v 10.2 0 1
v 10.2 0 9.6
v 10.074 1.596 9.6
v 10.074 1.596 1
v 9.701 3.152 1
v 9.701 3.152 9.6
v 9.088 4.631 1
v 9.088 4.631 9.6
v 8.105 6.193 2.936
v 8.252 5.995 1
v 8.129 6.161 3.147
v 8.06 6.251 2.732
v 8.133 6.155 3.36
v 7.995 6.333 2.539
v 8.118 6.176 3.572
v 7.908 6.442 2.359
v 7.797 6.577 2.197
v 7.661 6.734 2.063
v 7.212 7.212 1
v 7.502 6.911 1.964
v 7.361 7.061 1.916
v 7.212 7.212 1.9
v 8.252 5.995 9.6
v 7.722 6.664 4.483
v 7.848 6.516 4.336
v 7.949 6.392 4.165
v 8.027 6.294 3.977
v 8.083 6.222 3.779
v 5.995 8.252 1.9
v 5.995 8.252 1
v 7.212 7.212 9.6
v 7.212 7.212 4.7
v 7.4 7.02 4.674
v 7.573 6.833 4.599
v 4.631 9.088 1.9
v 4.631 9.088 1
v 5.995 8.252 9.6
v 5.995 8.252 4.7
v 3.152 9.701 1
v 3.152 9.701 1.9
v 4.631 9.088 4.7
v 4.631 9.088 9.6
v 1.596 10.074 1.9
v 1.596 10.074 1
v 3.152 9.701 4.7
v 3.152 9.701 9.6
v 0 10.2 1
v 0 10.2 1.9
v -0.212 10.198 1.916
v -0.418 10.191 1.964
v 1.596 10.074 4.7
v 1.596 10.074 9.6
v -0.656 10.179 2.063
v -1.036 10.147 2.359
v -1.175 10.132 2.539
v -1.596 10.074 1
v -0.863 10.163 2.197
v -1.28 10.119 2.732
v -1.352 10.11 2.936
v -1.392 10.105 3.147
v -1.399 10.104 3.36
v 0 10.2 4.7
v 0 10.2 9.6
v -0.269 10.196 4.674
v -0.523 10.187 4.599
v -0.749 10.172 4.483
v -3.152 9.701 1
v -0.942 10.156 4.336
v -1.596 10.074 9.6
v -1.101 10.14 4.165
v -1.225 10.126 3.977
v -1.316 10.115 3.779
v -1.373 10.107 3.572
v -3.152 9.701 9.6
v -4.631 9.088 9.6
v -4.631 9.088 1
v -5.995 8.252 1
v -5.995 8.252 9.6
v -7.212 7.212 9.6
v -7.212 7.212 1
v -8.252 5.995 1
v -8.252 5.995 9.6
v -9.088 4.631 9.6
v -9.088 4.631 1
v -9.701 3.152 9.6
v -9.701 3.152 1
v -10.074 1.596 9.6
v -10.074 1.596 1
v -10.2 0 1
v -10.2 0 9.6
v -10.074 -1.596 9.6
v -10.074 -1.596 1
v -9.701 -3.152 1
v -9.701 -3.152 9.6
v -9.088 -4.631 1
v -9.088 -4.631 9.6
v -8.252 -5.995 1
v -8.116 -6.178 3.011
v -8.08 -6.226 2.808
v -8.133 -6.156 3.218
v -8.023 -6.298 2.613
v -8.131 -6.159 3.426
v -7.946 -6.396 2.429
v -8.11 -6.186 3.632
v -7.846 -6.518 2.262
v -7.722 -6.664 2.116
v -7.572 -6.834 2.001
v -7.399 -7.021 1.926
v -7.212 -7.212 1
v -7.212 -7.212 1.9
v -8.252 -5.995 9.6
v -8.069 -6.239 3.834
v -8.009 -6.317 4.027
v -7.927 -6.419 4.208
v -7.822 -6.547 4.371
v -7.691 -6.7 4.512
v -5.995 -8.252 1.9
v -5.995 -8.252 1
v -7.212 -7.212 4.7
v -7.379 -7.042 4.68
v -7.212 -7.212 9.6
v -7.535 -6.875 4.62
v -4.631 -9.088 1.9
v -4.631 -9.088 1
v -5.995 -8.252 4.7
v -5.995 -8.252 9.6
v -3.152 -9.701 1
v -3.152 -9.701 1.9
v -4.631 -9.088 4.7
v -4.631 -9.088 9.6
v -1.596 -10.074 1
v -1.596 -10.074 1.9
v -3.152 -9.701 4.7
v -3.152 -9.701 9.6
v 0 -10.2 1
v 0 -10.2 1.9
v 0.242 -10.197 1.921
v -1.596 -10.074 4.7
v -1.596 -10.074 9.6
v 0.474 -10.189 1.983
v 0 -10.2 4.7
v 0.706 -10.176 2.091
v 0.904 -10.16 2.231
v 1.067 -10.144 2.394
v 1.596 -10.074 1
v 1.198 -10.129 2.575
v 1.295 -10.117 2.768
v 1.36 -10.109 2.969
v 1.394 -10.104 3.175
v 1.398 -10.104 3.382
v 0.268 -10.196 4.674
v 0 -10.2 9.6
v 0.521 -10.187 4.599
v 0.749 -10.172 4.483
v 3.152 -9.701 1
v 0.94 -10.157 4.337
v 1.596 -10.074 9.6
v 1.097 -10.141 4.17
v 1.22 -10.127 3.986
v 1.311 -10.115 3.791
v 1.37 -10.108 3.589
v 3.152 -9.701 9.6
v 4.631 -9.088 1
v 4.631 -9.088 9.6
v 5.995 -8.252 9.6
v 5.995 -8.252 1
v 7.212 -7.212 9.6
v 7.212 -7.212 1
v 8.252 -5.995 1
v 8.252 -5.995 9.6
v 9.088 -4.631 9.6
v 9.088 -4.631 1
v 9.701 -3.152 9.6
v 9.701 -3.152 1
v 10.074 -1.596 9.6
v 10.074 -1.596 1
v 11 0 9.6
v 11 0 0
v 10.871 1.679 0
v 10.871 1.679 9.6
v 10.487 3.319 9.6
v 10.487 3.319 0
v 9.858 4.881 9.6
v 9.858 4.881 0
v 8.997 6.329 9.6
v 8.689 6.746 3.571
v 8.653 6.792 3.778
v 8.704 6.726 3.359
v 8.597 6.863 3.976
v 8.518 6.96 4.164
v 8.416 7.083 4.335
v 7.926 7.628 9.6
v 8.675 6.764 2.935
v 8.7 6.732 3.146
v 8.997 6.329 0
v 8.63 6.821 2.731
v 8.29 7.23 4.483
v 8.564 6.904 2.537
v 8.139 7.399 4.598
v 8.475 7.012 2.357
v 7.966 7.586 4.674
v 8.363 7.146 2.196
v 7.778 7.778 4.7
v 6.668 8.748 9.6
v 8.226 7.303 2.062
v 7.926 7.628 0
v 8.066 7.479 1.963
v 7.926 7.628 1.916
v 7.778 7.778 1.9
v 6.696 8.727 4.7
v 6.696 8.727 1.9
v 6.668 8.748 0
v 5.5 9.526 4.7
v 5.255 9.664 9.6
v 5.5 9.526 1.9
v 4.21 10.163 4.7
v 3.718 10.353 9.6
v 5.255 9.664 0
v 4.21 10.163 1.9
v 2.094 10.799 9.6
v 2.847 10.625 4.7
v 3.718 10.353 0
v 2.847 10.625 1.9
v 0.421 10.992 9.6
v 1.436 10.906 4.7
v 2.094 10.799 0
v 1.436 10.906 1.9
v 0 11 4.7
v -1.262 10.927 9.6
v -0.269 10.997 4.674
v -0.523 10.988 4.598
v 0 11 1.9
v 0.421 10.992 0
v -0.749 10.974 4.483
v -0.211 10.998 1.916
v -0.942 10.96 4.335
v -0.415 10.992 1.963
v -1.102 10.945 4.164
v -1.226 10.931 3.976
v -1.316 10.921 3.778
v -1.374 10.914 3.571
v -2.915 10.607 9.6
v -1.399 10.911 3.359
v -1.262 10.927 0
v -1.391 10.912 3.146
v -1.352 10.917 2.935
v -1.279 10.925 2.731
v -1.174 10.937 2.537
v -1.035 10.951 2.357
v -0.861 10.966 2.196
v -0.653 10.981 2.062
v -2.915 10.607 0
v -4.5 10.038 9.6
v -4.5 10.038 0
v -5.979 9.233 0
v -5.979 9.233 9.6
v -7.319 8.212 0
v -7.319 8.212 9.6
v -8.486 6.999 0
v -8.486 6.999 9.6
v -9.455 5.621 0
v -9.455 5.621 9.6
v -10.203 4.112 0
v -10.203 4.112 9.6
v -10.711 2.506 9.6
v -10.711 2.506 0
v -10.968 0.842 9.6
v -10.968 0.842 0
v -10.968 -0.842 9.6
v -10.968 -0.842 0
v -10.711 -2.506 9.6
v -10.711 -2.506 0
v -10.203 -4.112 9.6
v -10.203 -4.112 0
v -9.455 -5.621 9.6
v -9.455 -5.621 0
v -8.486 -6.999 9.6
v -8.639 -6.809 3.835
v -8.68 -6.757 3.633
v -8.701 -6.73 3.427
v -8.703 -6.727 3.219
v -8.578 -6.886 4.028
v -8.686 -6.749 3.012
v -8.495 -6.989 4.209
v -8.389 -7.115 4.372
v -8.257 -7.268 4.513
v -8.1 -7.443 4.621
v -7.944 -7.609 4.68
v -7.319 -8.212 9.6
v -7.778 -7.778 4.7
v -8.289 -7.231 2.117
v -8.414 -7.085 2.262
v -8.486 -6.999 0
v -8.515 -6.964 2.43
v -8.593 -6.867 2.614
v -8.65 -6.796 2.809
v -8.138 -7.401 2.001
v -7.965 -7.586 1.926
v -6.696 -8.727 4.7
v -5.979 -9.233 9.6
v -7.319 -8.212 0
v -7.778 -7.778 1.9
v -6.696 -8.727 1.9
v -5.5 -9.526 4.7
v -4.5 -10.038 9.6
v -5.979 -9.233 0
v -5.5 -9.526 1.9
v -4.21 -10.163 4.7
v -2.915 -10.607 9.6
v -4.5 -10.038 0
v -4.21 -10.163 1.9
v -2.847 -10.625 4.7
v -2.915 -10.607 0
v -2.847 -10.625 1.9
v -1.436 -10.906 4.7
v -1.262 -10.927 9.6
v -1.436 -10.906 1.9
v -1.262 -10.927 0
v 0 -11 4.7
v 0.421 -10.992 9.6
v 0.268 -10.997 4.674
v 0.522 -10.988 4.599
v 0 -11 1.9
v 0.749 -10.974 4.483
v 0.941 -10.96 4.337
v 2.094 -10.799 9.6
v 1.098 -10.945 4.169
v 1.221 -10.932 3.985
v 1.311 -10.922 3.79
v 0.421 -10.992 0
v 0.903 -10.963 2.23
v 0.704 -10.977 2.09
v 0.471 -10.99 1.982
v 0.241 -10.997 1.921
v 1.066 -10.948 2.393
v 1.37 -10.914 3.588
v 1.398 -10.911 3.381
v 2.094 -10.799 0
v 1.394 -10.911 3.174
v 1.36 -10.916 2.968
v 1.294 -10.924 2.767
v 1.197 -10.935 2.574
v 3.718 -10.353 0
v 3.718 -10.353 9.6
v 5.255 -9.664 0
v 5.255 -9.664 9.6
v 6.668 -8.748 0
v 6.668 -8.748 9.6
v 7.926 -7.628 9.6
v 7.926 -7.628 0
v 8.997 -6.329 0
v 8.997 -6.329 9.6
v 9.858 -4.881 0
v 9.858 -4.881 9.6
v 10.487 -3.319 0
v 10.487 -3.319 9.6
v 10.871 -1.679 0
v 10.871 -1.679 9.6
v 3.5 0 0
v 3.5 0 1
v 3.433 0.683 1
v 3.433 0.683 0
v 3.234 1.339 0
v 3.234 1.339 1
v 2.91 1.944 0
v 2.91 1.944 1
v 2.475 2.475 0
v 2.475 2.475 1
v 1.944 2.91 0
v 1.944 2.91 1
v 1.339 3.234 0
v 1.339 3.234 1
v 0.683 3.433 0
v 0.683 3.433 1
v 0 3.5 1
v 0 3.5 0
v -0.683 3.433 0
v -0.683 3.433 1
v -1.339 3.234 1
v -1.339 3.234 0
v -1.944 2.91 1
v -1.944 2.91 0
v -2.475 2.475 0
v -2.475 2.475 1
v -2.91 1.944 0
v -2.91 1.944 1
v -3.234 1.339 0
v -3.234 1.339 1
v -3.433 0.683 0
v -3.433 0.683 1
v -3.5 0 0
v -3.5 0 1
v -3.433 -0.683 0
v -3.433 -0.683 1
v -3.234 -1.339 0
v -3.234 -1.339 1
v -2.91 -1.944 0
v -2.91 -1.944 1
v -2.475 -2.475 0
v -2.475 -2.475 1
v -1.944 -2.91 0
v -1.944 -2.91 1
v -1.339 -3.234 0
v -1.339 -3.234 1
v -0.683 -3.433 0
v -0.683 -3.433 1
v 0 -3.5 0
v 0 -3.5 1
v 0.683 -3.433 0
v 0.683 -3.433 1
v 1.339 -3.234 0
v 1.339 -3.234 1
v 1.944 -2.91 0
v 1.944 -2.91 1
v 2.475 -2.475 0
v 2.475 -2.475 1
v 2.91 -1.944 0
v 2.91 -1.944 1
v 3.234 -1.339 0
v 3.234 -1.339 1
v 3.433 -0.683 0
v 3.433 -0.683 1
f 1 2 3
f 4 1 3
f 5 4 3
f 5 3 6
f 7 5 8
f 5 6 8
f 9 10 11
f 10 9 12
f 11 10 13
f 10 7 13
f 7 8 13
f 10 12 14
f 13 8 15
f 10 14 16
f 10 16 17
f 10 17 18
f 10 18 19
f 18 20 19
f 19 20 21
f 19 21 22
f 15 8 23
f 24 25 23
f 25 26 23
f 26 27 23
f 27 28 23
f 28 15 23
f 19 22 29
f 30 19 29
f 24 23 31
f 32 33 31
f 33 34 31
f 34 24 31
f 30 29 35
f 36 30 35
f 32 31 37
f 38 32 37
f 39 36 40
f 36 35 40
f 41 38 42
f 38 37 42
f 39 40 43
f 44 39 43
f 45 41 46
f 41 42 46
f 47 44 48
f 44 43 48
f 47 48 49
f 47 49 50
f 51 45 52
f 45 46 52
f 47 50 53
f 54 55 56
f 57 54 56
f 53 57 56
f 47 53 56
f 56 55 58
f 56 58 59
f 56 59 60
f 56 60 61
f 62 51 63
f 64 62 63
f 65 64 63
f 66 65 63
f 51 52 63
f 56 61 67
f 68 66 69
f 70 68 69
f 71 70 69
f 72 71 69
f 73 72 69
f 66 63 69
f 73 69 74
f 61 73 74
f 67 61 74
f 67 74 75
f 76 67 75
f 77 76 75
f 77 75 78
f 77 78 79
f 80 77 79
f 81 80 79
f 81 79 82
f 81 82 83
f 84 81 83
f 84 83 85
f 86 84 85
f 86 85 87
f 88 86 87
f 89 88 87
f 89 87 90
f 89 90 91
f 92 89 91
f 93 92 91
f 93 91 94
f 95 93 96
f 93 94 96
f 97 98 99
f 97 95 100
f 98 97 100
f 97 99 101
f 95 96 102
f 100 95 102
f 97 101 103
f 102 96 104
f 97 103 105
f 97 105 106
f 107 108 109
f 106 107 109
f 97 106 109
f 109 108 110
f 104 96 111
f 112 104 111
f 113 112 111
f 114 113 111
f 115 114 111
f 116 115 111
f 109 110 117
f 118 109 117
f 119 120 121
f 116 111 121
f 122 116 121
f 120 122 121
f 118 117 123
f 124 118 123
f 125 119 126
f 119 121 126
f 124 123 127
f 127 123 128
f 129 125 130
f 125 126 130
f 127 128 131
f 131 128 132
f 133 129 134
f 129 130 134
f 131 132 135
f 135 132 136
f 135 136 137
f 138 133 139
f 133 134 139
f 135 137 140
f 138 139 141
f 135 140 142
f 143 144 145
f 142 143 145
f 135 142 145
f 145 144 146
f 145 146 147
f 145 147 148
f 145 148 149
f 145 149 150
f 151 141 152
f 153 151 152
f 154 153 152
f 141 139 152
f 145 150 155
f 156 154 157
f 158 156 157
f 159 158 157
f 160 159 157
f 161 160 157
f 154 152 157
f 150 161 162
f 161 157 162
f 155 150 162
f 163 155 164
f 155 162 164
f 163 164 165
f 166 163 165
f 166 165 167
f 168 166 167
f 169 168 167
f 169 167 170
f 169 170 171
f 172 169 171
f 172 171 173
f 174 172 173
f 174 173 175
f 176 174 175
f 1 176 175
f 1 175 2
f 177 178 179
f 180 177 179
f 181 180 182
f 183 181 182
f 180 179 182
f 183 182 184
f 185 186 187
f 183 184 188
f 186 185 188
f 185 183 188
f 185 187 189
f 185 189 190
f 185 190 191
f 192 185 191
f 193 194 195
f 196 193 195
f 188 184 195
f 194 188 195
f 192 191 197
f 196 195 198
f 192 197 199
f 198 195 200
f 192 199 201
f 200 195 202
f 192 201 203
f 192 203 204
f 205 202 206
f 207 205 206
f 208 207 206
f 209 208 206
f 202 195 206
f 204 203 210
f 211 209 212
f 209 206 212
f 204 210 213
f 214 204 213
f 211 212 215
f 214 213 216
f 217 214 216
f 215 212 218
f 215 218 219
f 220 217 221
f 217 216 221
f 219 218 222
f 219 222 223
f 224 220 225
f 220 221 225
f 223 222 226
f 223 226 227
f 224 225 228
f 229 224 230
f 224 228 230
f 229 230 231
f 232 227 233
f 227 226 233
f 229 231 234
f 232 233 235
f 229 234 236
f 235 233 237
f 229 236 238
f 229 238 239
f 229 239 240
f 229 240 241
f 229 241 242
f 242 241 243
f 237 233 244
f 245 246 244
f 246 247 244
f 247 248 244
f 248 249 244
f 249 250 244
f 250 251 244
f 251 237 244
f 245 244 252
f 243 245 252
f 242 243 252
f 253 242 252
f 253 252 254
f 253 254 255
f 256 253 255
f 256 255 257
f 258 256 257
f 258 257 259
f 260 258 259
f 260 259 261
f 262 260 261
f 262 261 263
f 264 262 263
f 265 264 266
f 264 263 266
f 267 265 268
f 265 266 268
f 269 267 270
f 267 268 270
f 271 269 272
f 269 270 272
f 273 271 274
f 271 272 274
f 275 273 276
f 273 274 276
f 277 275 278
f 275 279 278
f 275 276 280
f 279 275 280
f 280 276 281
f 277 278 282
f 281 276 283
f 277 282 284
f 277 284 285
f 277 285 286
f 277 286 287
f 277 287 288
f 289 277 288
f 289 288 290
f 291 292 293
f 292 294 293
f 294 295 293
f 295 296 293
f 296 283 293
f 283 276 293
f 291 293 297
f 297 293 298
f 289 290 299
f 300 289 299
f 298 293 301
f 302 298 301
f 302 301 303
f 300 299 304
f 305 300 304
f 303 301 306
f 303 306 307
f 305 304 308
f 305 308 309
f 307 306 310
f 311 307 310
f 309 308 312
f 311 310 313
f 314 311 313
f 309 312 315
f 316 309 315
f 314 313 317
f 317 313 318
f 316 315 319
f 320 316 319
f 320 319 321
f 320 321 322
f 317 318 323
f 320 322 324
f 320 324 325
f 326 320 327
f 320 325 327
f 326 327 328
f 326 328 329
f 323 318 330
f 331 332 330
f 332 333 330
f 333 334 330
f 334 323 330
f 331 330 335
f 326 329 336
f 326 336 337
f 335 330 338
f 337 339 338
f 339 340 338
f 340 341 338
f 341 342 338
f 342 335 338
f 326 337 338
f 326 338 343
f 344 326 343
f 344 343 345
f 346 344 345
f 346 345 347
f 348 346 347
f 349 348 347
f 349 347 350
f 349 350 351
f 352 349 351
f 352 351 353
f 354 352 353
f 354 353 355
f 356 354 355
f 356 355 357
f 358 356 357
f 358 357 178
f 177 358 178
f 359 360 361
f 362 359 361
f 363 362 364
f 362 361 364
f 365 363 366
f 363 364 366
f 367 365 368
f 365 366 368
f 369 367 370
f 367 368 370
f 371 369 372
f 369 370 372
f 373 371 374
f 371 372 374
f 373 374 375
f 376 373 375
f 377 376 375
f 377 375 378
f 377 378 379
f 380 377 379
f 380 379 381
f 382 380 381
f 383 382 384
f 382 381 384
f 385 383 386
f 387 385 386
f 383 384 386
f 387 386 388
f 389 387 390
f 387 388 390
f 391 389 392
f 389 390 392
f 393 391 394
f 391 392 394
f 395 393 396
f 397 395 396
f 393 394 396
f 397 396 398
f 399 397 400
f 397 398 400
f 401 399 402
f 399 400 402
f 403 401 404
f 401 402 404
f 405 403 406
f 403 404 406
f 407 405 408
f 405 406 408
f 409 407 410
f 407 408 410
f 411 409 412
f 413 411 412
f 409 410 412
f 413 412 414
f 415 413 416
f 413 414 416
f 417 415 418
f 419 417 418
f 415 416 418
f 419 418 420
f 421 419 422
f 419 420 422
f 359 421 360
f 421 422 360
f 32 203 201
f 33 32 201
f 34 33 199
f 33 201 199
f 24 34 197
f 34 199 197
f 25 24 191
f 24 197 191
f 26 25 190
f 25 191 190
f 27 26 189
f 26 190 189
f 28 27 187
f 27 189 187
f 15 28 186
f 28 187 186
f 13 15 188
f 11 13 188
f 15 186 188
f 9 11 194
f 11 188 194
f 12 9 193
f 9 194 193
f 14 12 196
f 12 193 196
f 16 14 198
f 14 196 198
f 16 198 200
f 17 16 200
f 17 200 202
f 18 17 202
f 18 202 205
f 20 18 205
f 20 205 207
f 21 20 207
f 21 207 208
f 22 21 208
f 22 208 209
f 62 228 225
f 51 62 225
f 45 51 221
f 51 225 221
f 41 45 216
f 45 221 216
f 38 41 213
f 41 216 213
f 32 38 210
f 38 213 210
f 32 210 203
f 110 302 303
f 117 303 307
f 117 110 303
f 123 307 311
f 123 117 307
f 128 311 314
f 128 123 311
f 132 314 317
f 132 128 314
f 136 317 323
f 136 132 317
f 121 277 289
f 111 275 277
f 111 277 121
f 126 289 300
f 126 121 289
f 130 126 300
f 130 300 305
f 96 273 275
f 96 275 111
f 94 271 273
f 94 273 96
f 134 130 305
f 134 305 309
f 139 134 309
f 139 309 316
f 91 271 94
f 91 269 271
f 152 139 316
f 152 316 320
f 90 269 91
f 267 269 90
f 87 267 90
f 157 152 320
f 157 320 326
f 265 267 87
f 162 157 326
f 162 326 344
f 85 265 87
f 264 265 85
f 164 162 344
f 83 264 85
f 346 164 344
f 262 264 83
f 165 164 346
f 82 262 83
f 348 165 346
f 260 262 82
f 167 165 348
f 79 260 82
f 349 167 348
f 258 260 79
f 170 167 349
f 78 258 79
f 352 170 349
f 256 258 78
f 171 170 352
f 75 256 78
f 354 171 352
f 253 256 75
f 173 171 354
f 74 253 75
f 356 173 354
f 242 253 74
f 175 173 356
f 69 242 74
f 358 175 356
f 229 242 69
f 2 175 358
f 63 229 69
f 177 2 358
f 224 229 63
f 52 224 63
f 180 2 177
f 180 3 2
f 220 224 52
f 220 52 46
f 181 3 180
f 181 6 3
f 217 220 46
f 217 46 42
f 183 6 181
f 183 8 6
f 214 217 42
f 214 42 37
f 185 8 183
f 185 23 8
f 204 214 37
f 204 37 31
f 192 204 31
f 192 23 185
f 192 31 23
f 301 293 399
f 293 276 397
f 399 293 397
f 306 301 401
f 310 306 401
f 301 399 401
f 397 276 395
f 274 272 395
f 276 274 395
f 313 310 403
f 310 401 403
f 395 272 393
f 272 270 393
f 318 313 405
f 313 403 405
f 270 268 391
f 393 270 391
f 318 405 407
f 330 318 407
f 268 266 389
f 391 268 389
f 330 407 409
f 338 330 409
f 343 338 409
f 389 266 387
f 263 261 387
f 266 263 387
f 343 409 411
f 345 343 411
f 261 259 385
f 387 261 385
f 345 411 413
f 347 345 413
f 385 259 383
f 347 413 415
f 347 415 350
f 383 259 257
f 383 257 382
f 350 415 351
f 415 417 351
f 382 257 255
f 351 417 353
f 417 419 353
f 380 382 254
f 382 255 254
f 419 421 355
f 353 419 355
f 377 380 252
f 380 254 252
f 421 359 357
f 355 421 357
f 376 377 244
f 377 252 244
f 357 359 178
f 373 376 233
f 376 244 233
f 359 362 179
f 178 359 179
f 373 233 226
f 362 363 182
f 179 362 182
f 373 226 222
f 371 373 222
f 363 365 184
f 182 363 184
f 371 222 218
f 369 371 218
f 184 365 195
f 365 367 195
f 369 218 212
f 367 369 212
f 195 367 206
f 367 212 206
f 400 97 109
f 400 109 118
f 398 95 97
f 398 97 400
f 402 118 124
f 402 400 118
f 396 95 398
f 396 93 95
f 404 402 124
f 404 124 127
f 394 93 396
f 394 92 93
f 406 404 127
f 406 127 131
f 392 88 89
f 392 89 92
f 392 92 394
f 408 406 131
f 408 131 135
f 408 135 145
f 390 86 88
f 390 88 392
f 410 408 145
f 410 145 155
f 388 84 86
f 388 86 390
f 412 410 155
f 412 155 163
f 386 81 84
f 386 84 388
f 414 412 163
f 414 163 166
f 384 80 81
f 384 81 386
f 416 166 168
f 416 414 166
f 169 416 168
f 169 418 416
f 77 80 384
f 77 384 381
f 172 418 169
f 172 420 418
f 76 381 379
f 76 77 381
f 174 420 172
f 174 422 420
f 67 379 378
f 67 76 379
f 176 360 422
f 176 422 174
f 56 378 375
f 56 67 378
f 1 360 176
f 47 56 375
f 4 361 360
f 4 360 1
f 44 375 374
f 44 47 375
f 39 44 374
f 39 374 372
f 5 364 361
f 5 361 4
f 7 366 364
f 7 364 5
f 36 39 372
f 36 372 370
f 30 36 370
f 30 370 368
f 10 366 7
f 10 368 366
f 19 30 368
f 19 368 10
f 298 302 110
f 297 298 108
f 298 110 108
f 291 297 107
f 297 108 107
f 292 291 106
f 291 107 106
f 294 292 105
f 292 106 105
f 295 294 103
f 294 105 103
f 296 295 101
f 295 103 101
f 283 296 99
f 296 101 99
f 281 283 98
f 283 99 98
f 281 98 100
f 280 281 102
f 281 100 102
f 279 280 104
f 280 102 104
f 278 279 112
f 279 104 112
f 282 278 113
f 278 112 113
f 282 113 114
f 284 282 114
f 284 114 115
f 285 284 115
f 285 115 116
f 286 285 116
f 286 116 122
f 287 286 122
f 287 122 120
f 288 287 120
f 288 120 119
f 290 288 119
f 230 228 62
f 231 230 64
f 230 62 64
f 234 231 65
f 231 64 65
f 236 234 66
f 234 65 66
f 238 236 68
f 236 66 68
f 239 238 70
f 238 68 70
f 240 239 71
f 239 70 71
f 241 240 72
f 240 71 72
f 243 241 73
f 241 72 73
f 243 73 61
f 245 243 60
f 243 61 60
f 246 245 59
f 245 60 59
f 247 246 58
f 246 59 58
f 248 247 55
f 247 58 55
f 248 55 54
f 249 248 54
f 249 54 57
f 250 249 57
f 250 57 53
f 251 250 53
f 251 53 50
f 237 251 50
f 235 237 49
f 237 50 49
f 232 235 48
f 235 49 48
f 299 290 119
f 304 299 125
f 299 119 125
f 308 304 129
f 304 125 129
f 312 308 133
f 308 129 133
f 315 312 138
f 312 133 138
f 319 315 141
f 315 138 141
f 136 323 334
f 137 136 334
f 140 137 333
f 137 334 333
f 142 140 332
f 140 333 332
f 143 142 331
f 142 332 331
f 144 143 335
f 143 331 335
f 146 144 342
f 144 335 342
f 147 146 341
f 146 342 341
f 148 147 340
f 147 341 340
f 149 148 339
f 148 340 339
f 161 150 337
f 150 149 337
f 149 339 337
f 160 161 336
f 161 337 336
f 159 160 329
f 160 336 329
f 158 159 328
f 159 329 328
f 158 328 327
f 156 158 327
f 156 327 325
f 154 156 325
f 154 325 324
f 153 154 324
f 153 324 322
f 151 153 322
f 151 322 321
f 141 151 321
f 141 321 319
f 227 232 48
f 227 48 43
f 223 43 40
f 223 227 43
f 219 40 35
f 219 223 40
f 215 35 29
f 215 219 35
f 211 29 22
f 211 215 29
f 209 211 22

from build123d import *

# Parameters (mm, degrees)
F0_R      = 11
F1_DEPTH  = 9.6
F2_R      = 10.2
F3_DEPTH  = 8.6
F4_R      = 1.4
F5_DEPTH  = 12.5
F8_R      = 1.4
F9_DEPTH  = 12.5
F12_DEPTH = 2.8
F13_R     = 3.5
F14_DEPTH = 1


with BuildPart() as f1:
    # F0 (on Top) → F1 (new body)
    with BuildSketch(Plane.XY):
        Circle(F0_R)
    extrude(amount=F1_DEPTH)

    # F2 (on face) → F3 (cut)
    with BuildSketch(Plane.XY.offset(9.6)):
        Circle(F2_R)
    extrude(amount=-F3_DEPTH, mode=Mode.SUBTRACT)

    # F4 (on Front) → F5 (cut, symmetric)
    with BuildSketch(Plane.XZ):
        with Locations((0, 3.3)):
            Circle(F4_R)
    extrude(amount=F5_DEPTH, both=True, mode=Mode.SUBTRACT)

    # F8 (on line) → F9 (cut, symmetric)
    with BuildSketch(Plane(origin=(0, 0, 0), x_dir=(-0.7071067812, 0.7071067812, 0), z_dir=(0.7071067812, 0.7071067812, 0))):
        with Locations((0, 3.3)):
            Circle(F8_R)
    extrude(amount=F9_DEPTH, both=True, mode=Mode.SUBTRACT)

    # F11 (on offset) → F12 (cut)
    with BuildSketch(Plane.XY.offset(1.9)):
        Polygon((0, 13.7625831805), (0, 0), (9.7316158935, 9.7316158935), align=None)
        Polygon((0, -13.7625831805), (0, 0), (-9.7316158935, -9.7316158935), align=None)
    extrude(amount=F12_DEPTH, mode=Mode.SUBTRACT)

    # F13 (on face) → F14 (cut, through all)
    with BuildSketch(Plane.XY.offset(1)):
        Circle(F13_R)
    extrude(amount=-F14_DEPTH, mode=Mode.SUBTRACT)


solid = f1.part
